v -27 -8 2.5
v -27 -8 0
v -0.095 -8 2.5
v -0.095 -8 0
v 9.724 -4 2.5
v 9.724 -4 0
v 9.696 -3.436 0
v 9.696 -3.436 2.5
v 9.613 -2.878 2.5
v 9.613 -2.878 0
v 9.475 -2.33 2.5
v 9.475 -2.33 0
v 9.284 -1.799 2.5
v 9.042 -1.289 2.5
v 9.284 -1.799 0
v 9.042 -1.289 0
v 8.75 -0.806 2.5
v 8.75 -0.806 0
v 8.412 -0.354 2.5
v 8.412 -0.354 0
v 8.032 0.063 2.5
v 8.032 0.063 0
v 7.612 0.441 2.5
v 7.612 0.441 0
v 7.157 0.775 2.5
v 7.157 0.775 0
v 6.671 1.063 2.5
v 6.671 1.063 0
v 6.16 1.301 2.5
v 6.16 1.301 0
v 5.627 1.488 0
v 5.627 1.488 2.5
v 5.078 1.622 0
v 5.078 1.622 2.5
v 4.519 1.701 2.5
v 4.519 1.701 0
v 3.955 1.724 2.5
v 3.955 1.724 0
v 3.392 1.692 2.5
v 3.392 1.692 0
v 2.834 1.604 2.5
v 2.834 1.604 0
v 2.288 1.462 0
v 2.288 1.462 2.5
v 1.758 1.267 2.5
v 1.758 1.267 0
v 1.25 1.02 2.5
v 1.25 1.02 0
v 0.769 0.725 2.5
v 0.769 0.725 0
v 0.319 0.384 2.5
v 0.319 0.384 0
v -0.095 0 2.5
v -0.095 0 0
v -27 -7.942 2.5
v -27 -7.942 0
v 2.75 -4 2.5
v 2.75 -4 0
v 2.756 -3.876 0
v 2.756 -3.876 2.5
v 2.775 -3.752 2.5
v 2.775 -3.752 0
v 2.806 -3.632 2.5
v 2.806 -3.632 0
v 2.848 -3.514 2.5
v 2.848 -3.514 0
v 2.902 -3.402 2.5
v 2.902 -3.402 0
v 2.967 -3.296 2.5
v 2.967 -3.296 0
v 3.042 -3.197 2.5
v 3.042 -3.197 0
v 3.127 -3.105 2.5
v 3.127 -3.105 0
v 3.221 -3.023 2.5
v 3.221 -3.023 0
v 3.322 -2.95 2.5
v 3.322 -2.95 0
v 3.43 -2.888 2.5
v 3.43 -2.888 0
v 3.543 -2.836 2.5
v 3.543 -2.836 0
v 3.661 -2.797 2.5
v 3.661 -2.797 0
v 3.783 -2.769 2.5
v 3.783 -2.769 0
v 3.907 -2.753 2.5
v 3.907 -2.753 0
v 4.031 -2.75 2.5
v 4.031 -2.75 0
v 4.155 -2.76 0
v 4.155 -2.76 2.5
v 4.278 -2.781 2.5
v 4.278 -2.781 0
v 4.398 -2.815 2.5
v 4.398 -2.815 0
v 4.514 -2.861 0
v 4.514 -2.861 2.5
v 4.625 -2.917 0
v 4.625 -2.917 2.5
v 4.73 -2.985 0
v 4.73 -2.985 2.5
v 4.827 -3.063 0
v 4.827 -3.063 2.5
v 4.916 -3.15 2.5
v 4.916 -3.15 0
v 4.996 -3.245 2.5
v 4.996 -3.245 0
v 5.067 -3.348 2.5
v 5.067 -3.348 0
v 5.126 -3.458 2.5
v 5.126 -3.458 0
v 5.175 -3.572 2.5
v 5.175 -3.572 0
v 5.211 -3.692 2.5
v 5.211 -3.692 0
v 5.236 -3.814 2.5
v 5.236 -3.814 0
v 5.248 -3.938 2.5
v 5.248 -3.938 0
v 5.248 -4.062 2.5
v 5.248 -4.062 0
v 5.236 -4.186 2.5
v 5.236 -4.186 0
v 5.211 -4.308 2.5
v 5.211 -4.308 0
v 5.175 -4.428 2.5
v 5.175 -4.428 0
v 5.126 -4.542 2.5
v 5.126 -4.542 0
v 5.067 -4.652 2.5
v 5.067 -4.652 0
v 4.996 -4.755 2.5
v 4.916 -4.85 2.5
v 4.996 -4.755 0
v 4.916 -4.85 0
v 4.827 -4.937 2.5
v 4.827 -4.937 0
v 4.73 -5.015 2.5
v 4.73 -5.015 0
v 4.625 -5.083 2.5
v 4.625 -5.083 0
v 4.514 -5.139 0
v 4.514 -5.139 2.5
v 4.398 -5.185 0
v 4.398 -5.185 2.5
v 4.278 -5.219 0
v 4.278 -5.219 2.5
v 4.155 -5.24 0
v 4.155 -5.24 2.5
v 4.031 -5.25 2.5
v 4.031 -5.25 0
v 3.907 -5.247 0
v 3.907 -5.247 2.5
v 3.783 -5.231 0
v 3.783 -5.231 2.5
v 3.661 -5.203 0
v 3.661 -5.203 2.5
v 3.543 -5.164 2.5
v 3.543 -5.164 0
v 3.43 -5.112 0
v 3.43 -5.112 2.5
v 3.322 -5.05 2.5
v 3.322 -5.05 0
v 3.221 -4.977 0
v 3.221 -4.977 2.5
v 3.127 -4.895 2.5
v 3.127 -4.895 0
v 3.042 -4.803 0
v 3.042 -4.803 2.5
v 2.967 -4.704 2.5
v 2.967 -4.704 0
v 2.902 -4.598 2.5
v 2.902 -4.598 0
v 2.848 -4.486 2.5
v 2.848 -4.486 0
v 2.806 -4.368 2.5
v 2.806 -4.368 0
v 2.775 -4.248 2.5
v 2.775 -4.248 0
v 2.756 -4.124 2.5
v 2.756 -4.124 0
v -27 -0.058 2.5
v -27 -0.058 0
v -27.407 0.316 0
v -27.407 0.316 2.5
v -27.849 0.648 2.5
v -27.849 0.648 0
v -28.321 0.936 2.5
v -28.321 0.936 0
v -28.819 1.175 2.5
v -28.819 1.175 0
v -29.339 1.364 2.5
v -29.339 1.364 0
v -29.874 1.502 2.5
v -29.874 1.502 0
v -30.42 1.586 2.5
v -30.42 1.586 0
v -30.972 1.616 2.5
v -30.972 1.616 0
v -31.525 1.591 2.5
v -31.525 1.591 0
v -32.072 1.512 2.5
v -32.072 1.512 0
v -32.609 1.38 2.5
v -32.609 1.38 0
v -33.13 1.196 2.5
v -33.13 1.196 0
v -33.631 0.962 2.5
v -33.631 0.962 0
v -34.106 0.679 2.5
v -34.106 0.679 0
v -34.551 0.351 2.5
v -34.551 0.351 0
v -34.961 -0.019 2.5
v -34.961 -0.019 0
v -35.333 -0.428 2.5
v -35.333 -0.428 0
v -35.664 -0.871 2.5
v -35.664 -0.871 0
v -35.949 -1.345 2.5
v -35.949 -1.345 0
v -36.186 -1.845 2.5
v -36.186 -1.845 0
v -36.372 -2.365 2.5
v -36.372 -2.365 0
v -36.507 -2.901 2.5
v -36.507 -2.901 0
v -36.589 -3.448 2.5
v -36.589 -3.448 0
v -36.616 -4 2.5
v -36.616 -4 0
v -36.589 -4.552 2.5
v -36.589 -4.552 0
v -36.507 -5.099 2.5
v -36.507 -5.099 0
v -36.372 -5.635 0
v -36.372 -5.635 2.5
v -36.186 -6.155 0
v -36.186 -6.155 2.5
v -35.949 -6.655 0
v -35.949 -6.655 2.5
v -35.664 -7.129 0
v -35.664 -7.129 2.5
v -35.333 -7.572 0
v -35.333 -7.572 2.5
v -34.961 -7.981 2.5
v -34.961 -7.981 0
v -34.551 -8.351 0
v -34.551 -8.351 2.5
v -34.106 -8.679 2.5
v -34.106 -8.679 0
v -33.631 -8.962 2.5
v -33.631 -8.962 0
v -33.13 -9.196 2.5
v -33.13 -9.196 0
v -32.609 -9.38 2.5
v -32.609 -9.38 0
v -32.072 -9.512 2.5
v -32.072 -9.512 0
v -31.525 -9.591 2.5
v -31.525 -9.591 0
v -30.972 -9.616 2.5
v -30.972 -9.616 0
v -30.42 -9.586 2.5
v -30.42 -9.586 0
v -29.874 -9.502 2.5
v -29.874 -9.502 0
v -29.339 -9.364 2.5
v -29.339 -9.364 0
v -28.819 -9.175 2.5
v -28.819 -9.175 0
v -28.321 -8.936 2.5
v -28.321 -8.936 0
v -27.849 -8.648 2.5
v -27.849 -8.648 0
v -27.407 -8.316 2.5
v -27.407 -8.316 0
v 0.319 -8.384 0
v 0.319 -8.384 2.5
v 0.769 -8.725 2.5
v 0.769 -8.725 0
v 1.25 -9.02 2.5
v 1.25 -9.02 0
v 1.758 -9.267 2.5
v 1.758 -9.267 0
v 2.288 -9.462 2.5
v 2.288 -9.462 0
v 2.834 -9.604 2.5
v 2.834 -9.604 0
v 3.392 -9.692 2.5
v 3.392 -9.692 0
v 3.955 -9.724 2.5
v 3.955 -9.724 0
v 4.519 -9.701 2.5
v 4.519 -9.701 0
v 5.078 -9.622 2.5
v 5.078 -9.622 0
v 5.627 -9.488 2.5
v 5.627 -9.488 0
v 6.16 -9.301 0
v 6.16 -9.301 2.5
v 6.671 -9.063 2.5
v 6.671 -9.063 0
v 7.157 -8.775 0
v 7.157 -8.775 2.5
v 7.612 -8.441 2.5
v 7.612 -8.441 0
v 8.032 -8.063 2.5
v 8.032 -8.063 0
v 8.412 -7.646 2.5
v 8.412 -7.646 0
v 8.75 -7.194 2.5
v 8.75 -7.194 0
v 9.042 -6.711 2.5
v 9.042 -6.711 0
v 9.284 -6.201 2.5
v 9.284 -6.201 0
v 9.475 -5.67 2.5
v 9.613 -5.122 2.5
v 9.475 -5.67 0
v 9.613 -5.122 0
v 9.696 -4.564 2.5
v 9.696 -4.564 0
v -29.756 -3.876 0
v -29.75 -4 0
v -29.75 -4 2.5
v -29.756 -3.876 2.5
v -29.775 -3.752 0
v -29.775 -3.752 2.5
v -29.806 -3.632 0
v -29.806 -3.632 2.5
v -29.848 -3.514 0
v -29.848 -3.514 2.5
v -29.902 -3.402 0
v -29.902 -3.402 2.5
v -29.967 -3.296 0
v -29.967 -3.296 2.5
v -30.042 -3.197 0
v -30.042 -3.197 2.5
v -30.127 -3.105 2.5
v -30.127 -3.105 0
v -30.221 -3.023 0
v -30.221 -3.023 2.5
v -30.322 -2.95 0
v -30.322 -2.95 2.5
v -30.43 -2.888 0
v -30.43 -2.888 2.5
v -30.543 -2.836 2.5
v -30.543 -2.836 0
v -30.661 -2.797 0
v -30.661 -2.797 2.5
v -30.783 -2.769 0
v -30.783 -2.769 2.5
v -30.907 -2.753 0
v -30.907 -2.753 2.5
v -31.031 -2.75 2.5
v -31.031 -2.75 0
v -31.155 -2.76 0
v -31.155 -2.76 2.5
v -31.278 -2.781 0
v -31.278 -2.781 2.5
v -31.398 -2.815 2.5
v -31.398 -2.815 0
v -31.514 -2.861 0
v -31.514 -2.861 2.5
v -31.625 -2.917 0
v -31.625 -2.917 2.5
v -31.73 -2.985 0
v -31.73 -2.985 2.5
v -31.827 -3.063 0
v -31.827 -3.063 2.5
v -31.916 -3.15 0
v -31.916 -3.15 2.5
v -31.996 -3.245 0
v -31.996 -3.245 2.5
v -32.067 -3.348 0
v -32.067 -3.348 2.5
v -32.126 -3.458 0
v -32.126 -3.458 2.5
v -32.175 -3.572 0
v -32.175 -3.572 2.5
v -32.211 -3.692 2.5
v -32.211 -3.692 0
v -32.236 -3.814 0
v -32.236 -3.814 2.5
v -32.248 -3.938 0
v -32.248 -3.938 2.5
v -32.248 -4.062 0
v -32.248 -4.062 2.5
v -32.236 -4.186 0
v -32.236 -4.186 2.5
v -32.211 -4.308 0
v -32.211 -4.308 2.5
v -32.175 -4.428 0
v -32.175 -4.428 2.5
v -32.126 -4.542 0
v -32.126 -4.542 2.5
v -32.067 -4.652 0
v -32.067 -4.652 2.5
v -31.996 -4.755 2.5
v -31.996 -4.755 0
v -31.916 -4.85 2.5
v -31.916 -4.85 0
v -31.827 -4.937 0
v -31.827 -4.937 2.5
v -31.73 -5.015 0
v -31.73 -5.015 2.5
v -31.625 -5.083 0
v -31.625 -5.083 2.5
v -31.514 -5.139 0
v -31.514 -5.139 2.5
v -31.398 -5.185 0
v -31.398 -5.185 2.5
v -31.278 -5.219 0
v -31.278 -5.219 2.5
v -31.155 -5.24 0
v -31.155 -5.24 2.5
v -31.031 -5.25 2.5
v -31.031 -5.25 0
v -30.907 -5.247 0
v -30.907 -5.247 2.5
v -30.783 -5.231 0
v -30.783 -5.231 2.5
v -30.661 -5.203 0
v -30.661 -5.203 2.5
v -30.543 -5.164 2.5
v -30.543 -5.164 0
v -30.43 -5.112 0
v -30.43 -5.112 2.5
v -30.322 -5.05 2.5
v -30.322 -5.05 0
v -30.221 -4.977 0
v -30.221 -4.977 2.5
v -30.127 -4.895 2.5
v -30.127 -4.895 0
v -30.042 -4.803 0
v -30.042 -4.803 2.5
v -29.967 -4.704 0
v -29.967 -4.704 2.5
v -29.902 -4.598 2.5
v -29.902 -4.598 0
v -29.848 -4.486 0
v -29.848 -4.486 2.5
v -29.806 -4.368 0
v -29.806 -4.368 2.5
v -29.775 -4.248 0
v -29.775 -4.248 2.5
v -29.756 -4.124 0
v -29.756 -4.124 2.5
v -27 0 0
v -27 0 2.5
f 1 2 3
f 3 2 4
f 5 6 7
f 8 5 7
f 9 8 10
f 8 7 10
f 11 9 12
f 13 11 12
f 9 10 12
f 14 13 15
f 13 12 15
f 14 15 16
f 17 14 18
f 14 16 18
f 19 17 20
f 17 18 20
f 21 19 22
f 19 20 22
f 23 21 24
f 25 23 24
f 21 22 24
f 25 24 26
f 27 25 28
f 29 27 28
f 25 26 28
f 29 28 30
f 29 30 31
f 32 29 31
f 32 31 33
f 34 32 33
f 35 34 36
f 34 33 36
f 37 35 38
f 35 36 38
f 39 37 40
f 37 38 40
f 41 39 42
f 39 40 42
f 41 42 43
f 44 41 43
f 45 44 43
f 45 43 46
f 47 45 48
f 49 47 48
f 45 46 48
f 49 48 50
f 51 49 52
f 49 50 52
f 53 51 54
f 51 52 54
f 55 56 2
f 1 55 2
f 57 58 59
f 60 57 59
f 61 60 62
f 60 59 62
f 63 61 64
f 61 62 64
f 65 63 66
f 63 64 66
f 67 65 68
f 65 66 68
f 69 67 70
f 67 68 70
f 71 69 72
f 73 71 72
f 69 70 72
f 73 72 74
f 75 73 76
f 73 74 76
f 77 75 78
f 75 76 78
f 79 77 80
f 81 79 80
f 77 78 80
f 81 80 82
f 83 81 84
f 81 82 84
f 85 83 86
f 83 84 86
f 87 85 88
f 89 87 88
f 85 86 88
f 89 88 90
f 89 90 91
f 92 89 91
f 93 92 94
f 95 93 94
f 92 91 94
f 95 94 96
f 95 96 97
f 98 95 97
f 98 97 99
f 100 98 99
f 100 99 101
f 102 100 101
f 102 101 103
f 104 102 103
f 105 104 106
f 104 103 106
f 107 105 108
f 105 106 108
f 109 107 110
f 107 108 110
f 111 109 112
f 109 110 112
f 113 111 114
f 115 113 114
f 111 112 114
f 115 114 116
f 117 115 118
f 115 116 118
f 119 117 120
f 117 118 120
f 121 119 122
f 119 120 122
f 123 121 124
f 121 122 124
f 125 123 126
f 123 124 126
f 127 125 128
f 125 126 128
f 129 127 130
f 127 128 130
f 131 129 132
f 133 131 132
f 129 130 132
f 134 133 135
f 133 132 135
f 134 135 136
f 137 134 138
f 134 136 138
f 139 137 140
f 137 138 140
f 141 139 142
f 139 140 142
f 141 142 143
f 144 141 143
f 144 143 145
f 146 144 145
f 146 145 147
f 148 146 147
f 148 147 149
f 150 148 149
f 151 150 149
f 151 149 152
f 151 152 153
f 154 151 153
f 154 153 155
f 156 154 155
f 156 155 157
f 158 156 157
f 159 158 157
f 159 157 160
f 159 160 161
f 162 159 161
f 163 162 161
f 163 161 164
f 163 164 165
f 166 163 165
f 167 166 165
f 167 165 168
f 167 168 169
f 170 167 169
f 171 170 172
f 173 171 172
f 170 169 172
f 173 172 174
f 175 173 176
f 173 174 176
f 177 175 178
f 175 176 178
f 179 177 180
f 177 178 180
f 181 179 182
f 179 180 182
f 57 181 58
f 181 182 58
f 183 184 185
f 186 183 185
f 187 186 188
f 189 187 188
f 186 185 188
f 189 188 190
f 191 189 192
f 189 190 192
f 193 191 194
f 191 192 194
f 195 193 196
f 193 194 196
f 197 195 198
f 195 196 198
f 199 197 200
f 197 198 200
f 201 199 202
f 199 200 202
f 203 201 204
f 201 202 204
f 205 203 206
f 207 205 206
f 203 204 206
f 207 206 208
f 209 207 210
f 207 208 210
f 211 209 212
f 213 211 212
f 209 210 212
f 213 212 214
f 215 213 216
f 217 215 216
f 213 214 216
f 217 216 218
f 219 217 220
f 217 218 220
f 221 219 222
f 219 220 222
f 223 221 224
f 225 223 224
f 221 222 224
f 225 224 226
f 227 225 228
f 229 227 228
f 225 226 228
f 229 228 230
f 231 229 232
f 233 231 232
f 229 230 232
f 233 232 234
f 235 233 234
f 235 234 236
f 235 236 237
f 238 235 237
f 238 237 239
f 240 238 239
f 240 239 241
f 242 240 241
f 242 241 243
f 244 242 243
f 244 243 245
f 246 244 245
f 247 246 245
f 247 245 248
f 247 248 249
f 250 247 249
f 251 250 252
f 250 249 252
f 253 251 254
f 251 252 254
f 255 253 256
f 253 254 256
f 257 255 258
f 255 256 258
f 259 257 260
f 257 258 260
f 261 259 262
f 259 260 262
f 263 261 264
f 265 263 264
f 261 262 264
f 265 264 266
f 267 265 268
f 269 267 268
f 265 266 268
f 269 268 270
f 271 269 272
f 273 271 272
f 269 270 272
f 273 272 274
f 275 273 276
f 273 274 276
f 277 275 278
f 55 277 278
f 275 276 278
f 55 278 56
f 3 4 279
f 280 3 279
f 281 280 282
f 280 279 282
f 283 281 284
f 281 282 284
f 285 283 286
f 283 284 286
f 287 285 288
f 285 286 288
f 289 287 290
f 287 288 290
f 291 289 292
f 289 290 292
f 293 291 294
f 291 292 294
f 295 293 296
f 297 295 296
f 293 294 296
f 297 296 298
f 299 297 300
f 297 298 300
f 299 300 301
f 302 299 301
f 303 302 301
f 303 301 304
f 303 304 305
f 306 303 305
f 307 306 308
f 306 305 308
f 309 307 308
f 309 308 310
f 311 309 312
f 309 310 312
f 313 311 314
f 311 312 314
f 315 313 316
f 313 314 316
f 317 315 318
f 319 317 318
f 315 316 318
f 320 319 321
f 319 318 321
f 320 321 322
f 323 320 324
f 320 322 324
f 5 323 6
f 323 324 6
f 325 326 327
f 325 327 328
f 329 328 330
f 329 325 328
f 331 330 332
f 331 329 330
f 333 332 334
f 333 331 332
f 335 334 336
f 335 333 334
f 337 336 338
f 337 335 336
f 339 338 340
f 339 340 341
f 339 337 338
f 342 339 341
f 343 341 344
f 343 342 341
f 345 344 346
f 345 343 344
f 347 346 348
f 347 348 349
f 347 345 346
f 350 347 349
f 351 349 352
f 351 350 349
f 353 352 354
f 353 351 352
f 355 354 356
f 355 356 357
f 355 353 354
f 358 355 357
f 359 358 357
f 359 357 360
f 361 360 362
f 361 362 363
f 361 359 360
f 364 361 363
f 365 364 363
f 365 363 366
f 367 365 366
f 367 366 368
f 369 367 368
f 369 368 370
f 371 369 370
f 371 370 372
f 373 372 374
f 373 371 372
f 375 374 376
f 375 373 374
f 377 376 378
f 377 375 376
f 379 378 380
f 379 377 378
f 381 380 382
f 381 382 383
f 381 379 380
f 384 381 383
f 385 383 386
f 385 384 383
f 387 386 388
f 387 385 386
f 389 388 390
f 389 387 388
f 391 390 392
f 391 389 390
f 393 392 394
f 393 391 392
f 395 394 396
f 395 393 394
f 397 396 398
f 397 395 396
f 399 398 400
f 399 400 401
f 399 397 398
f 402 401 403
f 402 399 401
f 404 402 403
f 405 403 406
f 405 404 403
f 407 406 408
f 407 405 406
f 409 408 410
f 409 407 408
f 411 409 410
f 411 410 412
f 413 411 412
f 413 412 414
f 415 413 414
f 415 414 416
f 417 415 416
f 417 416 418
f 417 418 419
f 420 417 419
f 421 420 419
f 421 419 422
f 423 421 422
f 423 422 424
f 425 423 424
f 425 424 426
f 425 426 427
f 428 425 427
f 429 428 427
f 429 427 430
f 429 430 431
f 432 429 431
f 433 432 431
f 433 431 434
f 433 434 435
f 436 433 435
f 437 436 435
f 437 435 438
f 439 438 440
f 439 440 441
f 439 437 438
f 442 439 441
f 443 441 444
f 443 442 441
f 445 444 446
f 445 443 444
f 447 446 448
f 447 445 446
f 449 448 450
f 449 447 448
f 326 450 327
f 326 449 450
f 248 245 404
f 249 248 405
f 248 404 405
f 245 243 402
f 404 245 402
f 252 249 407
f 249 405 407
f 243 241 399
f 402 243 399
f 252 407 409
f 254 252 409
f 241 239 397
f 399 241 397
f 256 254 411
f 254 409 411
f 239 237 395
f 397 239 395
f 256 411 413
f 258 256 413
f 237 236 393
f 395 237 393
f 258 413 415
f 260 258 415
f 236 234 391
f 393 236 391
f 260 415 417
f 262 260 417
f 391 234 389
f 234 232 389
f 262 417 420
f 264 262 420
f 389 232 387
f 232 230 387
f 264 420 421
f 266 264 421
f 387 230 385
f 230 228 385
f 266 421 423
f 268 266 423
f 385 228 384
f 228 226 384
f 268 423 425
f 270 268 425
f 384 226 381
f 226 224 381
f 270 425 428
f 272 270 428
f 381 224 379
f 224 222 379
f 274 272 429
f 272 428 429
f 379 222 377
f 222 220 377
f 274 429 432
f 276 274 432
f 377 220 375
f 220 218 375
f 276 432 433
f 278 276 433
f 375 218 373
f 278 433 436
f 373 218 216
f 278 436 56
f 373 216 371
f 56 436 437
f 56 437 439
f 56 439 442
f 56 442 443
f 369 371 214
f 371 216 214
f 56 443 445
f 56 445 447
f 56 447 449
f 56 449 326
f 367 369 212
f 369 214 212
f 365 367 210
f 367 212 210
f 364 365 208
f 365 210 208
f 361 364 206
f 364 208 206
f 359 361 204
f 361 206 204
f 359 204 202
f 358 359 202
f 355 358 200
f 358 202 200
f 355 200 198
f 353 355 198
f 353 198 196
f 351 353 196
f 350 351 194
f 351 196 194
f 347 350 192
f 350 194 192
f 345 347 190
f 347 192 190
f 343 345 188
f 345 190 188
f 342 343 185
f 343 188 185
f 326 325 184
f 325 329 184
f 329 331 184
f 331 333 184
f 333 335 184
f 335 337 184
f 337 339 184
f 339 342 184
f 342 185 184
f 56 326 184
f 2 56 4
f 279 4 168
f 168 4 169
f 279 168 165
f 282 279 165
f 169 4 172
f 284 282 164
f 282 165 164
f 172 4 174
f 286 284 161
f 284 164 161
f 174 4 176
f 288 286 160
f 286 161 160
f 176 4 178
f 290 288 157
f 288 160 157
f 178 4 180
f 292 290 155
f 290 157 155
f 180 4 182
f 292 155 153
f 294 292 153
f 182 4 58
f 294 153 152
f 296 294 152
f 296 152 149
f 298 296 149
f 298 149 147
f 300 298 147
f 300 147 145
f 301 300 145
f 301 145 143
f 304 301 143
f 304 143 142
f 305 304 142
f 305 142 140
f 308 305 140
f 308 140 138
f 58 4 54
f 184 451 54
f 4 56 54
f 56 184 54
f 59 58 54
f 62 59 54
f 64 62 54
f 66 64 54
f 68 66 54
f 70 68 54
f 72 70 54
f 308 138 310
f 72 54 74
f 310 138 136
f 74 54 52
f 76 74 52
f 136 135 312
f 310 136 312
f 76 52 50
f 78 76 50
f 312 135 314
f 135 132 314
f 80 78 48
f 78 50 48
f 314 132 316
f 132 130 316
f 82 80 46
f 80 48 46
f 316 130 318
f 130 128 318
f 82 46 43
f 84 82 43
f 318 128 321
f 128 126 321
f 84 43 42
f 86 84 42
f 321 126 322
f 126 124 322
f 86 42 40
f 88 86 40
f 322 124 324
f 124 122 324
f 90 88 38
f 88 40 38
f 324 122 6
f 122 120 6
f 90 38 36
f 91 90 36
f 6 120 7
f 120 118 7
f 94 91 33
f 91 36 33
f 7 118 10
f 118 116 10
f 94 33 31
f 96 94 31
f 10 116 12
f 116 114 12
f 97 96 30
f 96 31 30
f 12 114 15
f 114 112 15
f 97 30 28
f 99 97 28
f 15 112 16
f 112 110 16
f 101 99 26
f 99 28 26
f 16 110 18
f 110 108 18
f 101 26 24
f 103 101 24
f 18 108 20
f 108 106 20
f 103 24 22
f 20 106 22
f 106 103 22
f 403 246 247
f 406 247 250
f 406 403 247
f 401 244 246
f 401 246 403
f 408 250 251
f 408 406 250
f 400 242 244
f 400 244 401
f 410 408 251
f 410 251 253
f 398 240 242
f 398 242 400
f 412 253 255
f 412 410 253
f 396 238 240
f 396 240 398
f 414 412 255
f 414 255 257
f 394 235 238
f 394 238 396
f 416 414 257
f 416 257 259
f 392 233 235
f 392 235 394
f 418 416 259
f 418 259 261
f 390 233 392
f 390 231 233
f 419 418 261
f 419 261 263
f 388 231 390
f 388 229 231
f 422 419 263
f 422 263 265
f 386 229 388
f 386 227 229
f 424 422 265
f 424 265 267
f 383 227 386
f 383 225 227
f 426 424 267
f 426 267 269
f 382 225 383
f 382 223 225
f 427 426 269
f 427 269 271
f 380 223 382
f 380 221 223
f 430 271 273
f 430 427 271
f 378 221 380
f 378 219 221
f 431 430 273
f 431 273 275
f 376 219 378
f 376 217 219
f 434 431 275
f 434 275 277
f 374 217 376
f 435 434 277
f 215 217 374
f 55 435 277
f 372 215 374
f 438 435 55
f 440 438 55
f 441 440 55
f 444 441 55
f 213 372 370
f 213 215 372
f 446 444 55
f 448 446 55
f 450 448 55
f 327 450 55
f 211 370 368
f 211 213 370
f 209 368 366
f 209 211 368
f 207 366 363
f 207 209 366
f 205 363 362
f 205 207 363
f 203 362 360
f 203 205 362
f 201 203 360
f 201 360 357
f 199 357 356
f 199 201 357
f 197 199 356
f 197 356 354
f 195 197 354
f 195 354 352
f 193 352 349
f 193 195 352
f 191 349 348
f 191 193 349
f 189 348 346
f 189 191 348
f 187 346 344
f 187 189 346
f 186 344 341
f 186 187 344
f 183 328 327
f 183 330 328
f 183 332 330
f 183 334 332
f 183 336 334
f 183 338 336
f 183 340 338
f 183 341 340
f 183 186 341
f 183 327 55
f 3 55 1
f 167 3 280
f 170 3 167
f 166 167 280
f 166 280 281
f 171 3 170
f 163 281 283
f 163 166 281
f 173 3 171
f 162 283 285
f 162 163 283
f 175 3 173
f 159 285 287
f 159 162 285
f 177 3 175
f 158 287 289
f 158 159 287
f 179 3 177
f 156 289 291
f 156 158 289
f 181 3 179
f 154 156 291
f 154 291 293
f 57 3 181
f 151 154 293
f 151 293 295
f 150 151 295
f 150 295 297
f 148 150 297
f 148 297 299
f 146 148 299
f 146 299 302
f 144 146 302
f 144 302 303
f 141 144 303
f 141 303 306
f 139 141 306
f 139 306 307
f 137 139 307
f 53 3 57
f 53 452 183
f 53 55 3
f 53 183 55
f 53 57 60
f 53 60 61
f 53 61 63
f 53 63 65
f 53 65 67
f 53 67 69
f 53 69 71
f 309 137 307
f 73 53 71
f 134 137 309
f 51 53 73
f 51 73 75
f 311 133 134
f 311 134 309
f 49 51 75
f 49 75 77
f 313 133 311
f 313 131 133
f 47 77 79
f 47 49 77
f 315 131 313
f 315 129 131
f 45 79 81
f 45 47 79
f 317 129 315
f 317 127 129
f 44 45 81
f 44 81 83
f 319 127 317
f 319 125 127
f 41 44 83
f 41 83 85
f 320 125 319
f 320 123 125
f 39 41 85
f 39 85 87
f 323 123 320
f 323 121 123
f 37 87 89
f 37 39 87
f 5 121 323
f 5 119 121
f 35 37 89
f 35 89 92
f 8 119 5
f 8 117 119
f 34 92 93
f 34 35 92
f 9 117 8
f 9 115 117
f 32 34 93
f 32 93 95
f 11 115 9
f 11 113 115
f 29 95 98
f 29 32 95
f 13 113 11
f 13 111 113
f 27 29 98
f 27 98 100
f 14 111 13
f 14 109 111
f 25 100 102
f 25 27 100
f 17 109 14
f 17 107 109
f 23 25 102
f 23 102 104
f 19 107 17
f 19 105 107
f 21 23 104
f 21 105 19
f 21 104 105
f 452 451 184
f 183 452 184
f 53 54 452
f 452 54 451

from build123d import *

# Parameters (mm, degrees)
F0_R     = 1.25
F1_DEPTH = 2.5


with BuildPart() as f1:
    # F0 (on Top) → F1 (new body)
    with BuildSketch(Plane.XY):
        with BuildLine():
            Line((0, -4), (0, 0))
            Line((0, 0), (-0.0945953157, 0))
            ThreePointArc((-0.0945953157, 0), (-1.7241340654, -4), (-0.0945953157, -8))
            Line((-0.0945953157, -8), (0, -8))
            Line((0, -8), (0, -4))
        make_face()
        with BuildLine():
            Line((-0.0945953157, 0), (0, 0))
            Line((0, 0), (0, -4))
            Line((0, -4), (0, -8))
            Line((0, -8), (-0.0945953157, -8))
            ThreePointArc((-0.0945953157, -8), (6.159594669, -9.3011189069), (9.7241340654, -4))
            ThreePointArc((9.7241340654, -4), (6.159594669, 1.3011189069), (-0.0945953157, 0))
        make_face()
        with BuildLine():
            ThreePointArc((5.25, -4), (4, -5.25), (2.75, -4))
            ThreePointArc((2.75, -4), (4, -2.75), (5.25, -4))
        make_face(mode=Mode.SUBTRACT)
        with BuildLine():
            ThreePointArc((-0.0945953157, -8), (-1.7241340654, -4), (-0.0945953157, 0))
            Line((-0.0945953157, 0), (-27, 0))
            Line((-27, 0), (-27, -0.058367438))
            ThreePointArc((-27, -0.058367438), (-25.8038763073, -1.870031497), (-25.3842660984, -4))
            ThreePointArc((-25.3842660984, -4), (-25.8038763073, -6.129968503), (-27, -7.941632562))
            Line((-27, -7.941632562), (-27, -8))
            Line((-27, -8), (-0.0945953157, -8))
        make_face()
        with BuildLine():
            ThreePointArc((-25.3842660984, -4), (-25.8038763073, -1.870031497), (-27, -0.058367438))
            Line((-27, -0.058367438), (-27, -4))
            Line((-27, -4), (-27, -7.941632562))
            ThreePointArc((-27, -7.941632562), (-25.8038763073, -6.129968503), (-25.3842660984, -4))
        make_face()
        with BuildLine():
            Line((-27, -4), (-27, -0.058367438))
            ThreePointArc((-27, -0.058367438), (-36.6157339016, -4), (-27, -7.941632562))
            Line((-27, -7.941632562), (-27, -4))
        make_face()
        with Locations((-31, -4)):
            Circle(F0_R, mode=Mode.SUBTRACT)
    extrude(amount=F1_DEPTH)


solid = f1.part
